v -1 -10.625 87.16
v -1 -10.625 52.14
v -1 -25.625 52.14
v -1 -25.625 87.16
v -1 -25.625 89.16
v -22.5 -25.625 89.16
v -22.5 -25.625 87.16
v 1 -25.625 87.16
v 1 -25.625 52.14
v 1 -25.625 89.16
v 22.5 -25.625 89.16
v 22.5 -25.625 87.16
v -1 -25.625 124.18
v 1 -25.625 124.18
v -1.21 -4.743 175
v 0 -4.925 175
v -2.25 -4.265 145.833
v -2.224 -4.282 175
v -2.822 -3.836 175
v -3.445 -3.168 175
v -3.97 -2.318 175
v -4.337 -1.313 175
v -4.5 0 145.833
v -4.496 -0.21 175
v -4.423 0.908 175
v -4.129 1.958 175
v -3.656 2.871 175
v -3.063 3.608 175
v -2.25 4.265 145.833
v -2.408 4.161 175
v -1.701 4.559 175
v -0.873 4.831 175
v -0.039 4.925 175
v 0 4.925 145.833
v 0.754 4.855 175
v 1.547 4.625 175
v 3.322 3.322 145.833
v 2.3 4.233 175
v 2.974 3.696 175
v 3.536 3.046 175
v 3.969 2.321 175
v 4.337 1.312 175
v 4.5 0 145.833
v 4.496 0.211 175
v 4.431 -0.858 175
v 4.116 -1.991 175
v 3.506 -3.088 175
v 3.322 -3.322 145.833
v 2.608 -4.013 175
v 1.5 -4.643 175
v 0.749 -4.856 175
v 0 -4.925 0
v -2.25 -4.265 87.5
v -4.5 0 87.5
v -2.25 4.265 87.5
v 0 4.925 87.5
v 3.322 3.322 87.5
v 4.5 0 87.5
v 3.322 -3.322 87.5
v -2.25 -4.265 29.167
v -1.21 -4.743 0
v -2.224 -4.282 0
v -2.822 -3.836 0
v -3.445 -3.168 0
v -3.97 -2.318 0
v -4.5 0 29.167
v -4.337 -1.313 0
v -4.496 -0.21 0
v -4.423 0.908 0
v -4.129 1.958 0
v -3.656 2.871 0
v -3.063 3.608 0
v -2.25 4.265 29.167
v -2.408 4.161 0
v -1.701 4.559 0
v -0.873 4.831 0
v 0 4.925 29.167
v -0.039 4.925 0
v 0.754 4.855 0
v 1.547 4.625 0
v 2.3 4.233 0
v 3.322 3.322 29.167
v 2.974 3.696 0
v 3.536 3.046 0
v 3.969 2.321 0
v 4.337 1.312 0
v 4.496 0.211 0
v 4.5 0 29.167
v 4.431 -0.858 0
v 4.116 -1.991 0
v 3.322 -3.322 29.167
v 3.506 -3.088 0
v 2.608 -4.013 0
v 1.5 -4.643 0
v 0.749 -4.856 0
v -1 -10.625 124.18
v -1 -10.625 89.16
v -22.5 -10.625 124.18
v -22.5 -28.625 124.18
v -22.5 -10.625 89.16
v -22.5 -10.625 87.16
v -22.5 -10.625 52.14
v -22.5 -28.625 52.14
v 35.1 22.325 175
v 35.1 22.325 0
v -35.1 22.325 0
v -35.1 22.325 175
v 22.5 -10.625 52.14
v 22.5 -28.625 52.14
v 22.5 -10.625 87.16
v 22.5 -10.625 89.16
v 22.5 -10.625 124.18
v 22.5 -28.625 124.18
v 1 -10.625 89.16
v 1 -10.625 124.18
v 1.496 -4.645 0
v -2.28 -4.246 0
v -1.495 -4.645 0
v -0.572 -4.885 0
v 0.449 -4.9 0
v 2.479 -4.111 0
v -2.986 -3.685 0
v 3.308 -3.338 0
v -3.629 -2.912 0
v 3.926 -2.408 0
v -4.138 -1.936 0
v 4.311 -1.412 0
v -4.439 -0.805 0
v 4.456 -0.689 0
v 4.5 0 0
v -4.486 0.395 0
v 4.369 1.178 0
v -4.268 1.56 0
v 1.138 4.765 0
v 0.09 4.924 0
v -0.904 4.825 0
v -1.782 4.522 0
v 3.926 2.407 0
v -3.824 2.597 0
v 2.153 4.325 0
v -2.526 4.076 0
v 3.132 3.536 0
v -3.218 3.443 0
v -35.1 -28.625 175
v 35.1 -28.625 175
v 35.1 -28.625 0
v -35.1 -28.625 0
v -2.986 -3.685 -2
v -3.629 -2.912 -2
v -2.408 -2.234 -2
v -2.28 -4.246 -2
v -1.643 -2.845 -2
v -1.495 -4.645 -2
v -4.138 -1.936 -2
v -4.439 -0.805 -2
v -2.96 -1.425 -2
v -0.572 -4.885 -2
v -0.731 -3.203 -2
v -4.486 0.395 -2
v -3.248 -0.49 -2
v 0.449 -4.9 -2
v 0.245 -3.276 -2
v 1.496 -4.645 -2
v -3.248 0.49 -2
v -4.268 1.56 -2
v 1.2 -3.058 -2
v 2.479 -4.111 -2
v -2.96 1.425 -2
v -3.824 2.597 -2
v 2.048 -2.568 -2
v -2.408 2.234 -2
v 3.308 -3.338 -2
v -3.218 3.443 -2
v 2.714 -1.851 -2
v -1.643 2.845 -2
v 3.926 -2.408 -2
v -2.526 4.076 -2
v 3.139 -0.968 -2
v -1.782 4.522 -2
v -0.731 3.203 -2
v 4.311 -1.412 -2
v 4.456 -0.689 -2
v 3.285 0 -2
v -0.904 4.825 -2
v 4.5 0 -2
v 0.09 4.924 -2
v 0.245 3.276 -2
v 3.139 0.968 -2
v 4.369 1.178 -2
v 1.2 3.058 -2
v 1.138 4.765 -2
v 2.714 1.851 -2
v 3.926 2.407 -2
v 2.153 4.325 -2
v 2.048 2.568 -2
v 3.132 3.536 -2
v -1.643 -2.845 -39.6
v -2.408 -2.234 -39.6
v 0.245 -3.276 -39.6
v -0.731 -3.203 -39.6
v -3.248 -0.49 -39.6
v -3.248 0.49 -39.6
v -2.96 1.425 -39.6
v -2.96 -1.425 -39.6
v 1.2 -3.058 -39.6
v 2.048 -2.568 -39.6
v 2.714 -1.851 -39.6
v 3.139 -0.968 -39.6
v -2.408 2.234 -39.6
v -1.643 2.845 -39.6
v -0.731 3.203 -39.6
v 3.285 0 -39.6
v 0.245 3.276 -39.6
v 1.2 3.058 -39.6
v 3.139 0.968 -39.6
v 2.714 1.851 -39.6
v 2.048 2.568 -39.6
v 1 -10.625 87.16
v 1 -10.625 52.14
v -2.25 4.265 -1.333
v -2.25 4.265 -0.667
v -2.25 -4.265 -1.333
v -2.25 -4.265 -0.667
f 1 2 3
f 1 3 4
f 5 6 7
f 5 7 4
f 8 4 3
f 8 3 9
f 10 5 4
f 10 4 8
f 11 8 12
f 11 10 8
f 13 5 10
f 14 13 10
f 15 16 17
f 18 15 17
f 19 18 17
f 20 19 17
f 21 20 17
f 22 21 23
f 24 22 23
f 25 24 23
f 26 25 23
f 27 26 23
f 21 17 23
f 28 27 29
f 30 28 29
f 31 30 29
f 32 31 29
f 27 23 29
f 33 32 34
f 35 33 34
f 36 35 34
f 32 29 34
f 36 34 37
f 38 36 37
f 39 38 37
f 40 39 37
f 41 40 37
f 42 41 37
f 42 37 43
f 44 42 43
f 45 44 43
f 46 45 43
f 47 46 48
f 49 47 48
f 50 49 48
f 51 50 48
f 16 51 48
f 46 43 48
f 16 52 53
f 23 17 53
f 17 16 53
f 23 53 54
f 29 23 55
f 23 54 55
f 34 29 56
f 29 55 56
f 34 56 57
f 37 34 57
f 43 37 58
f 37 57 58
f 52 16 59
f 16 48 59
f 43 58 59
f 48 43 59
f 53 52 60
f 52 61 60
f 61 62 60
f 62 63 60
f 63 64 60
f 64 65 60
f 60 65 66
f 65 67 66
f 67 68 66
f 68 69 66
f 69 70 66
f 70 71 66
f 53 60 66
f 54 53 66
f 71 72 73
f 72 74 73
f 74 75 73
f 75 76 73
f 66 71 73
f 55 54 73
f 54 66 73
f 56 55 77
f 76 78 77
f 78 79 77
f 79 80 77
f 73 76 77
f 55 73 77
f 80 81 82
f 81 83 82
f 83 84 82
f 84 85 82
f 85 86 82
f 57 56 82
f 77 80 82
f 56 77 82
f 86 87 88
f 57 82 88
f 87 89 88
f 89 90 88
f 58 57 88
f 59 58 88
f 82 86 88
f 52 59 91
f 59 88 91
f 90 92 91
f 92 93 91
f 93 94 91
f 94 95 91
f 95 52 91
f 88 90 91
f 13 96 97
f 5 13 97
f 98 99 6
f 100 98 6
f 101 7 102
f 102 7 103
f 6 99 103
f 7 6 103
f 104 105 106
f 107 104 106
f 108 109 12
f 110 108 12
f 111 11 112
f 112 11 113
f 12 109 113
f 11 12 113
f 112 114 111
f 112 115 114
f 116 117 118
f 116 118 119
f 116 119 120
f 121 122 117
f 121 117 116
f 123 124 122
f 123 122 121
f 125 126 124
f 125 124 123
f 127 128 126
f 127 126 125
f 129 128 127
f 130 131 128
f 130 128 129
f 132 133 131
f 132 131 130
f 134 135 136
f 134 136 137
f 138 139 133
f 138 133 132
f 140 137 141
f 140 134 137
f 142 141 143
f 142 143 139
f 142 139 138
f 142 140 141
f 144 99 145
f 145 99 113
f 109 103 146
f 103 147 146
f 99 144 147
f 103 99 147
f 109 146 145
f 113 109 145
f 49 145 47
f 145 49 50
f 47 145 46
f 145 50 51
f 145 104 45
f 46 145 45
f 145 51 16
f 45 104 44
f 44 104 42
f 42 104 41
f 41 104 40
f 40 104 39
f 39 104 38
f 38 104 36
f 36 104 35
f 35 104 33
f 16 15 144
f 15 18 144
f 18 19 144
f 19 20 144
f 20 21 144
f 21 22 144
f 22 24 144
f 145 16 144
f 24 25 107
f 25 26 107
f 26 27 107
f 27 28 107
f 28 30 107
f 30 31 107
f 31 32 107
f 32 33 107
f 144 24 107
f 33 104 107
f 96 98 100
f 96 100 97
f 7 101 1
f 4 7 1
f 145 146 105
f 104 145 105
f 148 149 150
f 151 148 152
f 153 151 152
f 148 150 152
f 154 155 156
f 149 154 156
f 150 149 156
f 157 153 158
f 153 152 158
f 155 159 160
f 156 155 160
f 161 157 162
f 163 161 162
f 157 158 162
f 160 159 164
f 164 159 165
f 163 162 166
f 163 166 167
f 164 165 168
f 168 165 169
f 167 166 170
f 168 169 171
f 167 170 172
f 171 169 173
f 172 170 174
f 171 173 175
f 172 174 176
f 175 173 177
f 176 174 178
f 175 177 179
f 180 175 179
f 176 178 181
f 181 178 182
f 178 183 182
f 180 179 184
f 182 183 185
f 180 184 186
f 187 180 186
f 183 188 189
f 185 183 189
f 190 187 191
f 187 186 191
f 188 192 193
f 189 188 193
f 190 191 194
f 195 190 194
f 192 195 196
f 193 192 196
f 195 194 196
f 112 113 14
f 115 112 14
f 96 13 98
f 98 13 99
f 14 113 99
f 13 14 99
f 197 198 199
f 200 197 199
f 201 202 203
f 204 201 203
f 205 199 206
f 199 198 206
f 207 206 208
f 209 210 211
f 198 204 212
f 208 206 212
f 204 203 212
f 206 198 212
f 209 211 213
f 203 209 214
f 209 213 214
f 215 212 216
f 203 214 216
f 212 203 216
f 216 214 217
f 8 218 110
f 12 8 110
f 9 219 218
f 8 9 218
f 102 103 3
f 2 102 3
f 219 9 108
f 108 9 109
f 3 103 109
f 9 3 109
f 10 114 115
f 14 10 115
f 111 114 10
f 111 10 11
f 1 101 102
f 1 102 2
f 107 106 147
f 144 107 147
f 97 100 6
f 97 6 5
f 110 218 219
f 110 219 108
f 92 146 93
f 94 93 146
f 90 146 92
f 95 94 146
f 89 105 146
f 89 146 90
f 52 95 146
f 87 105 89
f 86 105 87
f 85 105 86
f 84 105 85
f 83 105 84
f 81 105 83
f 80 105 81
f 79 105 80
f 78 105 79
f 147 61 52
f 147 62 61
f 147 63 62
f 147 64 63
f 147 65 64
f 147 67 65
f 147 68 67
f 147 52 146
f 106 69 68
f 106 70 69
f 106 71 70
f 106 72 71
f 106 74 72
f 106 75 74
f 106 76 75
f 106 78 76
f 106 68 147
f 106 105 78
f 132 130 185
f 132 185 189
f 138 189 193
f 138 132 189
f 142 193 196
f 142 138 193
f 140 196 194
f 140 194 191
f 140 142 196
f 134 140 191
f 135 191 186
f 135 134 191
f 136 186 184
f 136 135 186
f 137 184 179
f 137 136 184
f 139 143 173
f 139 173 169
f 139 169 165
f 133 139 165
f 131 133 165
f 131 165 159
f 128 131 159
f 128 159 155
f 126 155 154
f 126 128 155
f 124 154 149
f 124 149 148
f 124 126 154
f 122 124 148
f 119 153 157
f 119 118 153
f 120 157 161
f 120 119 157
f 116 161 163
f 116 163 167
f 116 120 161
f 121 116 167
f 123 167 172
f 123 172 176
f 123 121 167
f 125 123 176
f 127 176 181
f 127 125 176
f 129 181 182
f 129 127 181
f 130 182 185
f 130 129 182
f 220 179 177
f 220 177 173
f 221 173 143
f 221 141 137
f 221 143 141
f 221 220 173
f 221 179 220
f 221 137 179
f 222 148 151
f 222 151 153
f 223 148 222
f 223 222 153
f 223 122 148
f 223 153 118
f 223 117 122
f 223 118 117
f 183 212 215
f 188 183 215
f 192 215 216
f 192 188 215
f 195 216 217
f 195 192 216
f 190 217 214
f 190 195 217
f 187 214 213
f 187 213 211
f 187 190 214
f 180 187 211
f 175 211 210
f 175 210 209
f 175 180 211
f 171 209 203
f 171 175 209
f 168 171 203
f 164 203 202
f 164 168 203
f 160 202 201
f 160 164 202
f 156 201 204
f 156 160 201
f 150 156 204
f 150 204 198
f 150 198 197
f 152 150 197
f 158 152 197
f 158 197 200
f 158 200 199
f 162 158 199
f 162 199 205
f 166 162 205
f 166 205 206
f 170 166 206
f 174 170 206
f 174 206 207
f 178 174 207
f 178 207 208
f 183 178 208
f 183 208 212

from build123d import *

# Parameters (mm, degrees)
F0_R     = 3.285
F1_DEPTH = 39.6
F3_DEPTH = 2
F5_DEPTH = 175
F7_DEPTH = 18
F8_W     = 1
F8_H     = 35.02
F8_H_2   = 1
F8_W_2   = 21.5
F9_DEPTH = 15


with BuildPart() as f1:
    # F0 (on Top) → F1 (new body)
    with BuildSketch(Plane.XY):
        Circle(F0_R)
    extrude(amount=-F1_DEPTH)

    # F2 (on Top) → F3 (join)
    with BuildSketch(Plane.XY):
        with BuildLine():
            add(Edge.make_bspline(
                [(4.5, 0), (4.5, 8.5303502273), (-2.25, 4.2651751136), (-9, 0), (-2.25, -4.2651751136), (4.5, -8.5303502273), (4.5, 0)],
                knots=[4.7123889804, 4.7123889804, 4.7123889804, 6.8067840828, 6.8067840828, 8.9011791852, 8.9011791852, 10.9955742876, 10.9955742876, 10.9955742876], degree=2, weights=[1, 0.5, 1, 0.5, 1, 0.5, 1]))
        make_face()
    extrude(amount=-F3_DEPTH)


with BuildPart() as f5:
    # F4 (on face) → F5 (new body)
    with BuildSketch(Plane.XY):
        with BuildLine():
            add(Edge.make_bspline(
                [(0, 4.925), (-1.2057713659, 4.925), (-2.25, 4.2651751136), (-4.5, 2.8434500758), (-4.5, 0)],
                knots=[6.2455926065, 6.2455926065, 6.2455926065, 6.8067840828, 6.8067840828, 7.853981634, 7.853981634, 7.853981634], degree=2, weights=[0.8038475773, 0.8660254038, 1, 0.75, 0.75]))
            Line((0, 4.925), (0, 22.325))
            Line((0, 22.325), (-35.1, 22.325))
            Line((-35.1, 22.325), (-35.1, 0))
            Line((-35.1, 0), (-4.5, 0))
        make_face()
        with BuildLine():
            Line((35.1, 0), (4.5, 0))
            add(Edge.make_bspline(
                [(0, -4.925), (4.5, -4.925), (4.5, 0)],
                knots=[9.4623706615, 9.4623706615, 9.4623706615, 10.9955742876, 10.9955742876, 10.9955742876], degree=2, weights=[0.8038475773, 0.6339745962, 1]))
            Line((0, -4.925), (0, -28.625))
            Line((0, -28.625), (35.1, -28.625))
            Line((35.1, -28.625), (35.1, 0))
        make_face()
        with BuildLine():
            Line((0, 22.325), (0, 4.925))
            add(Edge.make_bspline(
                [(4.5, 0), (4.5, 4.925), (0, 4.925)],
                knots=[4.7123889804, 4.7123889804, 4.7123889804, 6.2455926065, 6.2455926065, 6.2455926065], degree=2, weights=[1, 0.6339745962, 0.8038475773]))
            Line((4.5, 0), (35.1, 0))
            Line((35.1, 0), (35.1, 22.325))
            Line((35.1, 22.325), (0, 22.325))
        make_face()
        with BuildLine():
            add(Edge.make_bspline(
                [(-4.5, 0), (-4.5, -2.8434500758), (-2.25, -4.2651751136), (-1.2057713659, -4.925), (0, -4.925)],
                knots=[7.853981634, 7.853981634, 7.853981634, 8.9011791852, 8.9011791852, 9.4623706615, 9.4623706615, 9.4623706615], degree=2, weights=[0.75, 0.75, 1, 0.8660254038, 0.8038475773]))
            Line((-4.5, 0), (-35.1, 0))
            Line((-35.1, 0), (-35.1, -28.625))
            Line((-35.1, -28.625), (0, -28.625))
            Line((0, -28.625), (0, -4.925))
        make_face()
    extrude(amount=F5_DEPTH)

    # F6 (on face) → F7 (cut)
    with BuildSketch(Plane.XZ.offset(28.625)):
        Polygon((-22.5, 52.14), (0, 52.14), (22.5, 52.14), (22.5, 124.18), (-22.5, 124.18), align=None)
    extrude(amount=-F7_DEPTH, mode=Mode.SUBTRACT)

    # F8 (on face) → F9 (join)
    with BuildSketch(Plane.XZ.offset(10.625)):
        with Locations((-0.5, 106.67)):
            Rectangle(F8_W, F8_H)
        with Locations((0.5, 106.67)):
            Rectangle(F8_W, F8_H)
        with Locations((-0.5, 88.66)):
            Rectangle(F8_W, F8_H_2)
        with Locations((-11.75, 88.66)):
            Rectangle(F8_W_2, F8_H_2)
        with Locations((0.5, 88.66)):
            Rectangle(F8_W, F8_H_2)
        with Locations((11.75, 88.66)):
            Rectangle(F8_W_2, F8_H_2)
        with Locations((0.5, 87.66)):
            Rectangle(F8_W, F8_H_2)
        with Locations((-0.5, 87.66)):
            Rectangle(F8_W, F8_H_2)
        with Locations((-11.75, 87.66)):
            Rectangle(F8_W_2, F8_H_2)
        with Locations((11.75, 87.66)):
            Rectangle(F8_W_2, F8_H_2)
        with Locations((0.5, 69.65)):
            Rectangle(F8_W, F8_H)
        with Locations((-0.5, 69.65)):
            Rectangle(F8_W, F8_H)
    extrude(amount=F9_DEPTH)


solid = Compound([f1.part, f5.part])
